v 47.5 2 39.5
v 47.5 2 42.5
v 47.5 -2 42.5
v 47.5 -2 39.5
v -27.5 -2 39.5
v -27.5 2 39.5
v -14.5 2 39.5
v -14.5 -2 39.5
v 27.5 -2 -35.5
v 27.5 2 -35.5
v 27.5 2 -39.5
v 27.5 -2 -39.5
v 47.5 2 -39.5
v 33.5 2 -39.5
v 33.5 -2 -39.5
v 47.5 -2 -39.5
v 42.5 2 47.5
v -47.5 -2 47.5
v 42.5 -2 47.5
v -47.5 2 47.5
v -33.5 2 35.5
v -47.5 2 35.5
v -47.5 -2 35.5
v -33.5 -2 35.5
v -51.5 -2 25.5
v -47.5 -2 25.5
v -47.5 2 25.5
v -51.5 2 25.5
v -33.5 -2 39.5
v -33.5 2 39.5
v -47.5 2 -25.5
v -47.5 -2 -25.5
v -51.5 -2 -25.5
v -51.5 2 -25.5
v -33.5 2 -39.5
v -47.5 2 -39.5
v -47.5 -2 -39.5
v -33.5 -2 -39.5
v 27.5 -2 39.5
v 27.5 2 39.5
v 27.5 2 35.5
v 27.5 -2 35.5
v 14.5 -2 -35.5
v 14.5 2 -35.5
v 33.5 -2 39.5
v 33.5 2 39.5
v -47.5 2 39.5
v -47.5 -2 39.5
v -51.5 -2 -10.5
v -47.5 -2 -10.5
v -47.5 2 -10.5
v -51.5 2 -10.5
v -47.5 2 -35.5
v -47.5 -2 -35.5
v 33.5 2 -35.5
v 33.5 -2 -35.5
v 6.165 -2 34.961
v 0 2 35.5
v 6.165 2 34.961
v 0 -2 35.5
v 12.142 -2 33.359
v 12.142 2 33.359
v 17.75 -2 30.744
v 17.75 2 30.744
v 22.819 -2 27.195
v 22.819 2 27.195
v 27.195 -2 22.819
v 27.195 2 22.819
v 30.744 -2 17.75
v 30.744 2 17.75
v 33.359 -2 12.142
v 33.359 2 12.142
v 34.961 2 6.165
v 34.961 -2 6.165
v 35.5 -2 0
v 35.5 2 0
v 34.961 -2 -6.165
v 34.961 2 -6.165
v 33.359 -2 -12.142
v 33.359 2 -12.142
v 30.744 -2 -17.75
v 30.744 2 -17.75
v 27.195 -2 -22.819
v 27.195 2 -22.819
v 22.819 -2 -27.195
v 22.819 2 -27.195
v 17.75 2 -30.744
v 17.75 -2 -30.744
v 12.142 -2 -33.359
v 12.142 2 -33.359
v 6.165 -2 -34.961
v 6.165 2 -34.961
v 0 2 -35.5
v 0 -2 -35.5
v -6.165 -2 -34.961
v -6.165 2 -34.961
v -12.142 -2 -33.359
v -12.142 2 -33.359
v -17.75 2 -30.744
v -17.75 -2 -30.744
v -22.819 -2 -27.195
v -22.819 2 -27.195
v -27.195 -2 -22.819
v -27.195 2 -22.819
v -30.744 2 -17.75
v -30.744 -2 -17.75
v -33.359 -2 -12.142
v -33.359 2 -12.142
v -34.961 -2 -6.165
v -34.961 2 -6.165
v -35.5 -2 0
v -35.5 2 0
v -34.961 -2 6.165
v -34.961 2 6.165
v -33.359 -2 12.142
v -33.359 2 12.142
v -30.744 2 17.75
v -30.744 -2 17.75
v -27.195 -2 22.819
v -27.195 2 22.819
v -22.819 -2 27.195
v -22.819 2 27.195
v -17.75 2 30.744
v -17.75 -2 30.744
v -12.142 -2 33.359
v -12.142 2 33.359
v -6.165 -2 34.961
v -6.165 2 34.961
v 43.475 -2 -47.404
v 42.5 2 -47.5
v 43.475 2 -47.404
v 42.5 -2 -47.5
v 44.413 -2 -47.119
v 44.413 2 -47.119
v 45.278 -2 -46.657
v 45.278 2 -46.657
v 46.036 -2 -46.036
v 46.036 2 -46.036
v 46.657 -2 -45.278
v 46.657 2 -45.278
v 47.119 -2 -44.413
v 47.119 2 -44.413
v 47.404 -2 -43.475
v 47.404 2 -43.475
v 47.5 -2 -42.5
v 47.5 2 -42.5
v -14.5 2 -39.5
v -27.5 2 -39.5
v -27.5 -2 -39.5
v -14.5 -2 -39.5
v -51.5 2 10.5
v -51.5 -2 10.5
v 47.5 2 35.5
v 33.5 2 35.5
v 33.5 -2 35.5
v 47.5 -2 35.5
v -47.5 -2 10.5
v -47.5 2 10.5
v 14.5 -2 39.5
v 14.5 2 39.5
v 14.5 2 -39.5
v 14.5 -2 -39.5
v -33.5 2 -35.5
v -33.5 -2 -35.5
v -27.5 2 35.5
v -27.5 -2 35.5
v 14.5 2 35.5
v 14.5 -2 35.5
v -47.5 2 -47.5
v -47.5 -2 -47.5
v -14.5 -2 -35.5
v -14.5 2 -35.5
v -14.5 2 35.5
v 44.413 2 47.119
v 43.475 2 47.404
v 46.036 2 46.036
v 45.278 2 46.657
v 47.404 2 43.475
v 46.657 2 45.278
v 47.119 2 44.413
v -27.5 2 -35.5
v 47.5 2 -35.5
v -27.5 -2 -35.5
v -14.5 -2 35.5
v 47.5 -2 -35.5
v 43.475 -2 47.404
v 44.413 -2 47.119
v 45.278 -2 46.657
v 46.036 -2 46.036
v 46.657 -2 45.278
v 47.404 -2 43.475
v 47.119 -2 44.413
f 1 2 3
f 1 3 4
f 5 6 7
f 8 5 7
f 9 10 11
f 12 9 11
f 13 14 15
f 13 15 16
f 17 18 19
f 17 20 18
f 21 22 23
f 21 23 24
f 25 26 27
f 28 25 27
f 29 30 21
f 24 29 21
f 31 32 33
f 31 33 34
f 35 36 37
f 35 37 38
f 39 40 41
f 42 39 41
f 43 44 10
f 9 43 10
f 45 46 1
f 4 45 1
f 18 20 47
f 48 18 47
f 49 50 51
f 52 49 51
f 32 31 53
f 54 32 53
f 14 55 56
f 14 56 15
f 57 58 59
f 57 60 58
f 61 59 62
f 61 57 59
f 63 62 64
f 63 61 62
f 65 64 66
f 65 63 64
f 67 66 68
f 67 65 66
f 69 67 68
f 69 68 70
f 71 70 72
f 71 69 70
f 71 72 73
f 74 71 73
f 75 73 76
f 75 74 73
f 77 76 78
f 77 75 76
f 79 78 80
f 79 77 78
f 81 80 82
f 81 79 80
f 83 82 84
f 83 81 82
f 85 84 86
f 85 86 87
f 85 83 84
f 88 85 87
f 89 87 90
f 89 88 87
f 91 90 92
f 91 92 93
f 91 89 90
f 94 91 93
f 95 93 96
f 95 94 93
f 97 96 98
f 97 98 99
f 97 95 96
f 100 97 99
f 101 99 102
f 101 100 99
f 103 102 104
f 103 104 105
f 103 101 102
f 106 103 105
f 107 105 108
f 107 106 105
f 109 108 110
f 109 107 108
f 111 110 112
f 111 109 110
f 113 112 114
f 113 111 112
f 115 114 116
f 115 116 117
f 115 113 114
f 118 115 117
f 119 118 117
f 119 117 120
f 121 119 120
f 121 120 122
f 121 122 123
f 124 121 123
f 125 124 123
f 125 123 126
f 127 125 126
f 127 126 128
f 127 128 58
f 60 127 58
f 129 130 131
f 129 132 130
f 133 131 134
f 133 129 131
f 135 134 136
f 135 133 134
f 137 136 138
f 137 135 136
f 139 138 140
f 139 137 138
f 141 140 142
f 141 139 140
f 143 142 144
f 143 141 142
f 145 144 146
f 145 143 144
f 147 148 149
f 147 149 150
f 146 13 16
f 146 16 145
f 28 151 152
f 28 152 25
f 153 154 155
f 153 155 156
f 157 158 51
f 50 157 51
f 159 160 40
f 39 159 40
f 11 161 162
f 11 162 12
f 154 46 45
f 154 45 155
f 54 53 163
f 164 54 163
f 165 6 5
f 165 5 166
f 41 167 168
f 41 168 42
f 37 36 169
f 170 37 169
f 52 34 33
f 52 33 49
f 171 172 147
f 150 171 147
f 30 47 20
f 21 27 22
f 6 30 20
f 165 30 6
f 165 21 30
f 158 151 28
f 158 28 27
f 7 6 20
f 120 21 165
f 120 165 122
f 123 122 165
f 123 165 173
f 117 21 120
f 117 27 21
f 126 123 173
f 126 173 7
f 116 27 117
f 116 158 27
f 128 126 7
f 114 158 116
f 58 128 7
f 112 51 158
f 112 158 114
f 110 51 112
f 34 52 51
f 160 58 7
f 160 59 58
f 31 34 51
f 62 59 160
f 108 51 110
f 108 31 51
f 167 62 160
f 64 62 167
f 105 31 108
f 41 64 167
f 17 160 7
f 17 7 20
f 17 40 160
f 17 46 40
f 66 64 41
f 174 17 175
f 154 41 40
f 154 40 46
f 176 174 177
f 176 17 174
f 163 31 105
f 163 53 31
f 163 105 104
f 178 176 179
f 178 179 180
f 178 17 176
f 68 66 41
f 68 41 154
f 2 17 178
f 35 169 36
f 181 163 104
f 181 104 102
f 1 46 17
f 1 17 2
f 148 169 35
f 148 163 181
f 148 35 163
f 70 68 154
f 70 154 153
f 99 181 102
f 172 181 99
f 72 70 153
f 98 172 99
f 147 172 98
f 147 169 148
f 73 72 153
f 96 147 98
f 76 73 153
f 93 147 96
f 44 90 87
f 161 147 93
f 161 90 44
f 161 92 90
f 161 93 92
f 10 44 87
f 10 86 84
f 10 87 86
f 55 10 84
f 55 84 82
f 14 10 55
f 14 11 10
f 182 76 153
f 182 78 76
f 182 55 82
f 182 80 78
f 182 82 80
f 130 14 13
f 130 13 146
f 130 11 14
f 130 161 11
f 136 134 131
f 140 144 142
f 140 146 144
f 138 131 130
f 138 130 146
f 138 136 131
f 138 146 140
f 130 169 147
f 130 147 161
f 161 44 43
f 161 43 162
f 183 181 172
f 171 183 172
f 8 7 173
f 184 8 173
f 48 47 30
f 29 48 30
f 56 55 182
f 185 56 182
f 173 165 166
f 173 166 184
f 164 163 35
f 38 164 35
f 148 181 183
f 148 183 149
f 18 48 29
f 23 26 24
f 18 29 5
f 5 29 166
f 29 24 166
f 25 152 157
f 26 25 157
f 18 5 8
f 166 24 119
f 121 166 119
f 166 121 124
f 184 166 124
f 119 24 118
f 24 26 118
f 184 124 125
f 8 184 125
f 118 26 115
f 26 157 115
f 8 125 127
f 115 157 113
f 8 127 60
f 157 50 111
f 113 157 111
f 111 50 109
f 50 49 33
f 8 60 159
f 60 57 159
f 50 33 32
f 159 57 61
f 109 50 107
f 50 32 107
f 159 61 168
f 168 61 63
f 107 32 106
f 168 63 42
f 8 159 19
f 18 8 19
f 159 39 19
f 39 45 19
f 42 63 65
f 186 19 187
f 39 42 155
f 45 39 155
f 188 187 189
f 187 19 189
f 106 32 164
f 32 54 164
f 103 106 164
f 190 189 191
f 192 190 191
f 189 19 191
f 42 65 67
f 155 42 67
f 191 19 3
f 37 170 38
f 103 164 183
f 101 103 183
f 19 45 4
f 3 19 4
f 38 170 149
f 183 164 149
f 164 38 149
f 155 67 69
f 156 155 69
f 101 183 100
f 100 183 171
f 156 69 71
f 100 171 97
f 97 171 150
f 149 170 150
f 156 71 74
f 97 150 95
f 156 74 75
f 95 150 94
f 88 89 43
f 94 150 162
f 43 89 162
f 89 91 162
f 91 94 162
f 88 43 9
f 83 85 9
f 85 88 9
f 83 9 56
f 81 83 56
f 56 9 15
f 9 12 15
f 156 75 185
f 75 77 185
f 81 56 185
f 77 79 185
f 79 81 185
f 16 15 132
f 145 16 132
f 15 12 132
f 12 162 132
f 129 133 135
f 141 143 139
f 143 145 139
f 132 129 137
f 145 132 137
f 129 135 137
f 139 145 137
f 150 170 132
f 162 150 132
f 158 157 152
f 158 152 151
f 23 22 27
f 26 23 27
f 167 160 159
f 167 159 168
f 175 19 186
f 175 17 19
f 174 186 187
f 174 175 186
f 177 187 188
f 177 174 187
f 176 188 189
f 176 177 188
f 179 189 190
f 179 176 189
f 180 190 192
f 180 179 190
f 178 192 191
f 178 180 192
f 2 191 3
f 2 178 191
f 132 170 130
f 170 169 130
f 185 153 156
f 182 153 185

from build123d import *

# Parameters (mm, degrees)
SKETCH1_W           = 95
SKETCH1_H           = 95
SKETCH1_R           = 35.5
BOSS_EXTRUDE1_DEPTH = 2
SKETCH3_W           = 14
SKETCH3_H           = 4
SKETCH3_W_2         = 13
CUT_EXTRUDE5_DEPTH  = 68.294130502
SKETCH4_W           = 15
SKETCH4_H           = 4
BOSS_EXTRUDE2_DEPTH = 4
FILLET1_R           = 5


with BuildPart() as part:
    # Sketch1 → Boss-Extrude1 (new, symmetric)
    with BuildSketch(Plane(origin=(0, 0, 0), x_dir=(1, 0, 0), z_dir=(0, 1, 0))):
        Rectangle(SKETCH1_W, SKETCH1_H)
        Circle(SKETCH1_R, mode=Mode.SUBTRACT)
    extrude(amount=BOSS_EXTRUDE1_DEPTH, both=True)

    # Sketch3 → Cut-Extrude5 (cut, through all)
    with BuildSketch(Plane(origin=(0, 2, 0), x_dir=(1, 0, 0), z_dir=(0, 1, 0))):
        with Locations((-40.5, -37.5)):
            Rectangle(SKETCH3_W, SKETCH3_H)
        with Locations((-40.5, 37.5)):
            Rectangle(SKETCH3_W, SKETCH3_H)
        with Locations((21, 37.5)):
            Rectangle(SKETCH3_W_2, SKETCH3_H)
        with Locations((40.5, -37.5)):
            Rectangle(SKETCH3_W, SKETCH3_H)
        with Locations((40.5, 37.5)):
            Rectangle(SKETCH3_W, SKETCH3_H)
        with Locations((21, -37.5)):
            Rectangle(SKETCH3_W_2, SKETCH3_H)
        with Locations((-21, -37.5)):
            Rectangle(SKETCH3_W_2, SKETCH3_H)
        with Locations((-21, 37.5)):
            Rectangle(SKETCH3_W_2, SKETCH3_H)
    extrude(amount=-CUT_EXTRUDE5_DEPTH, mode=Mode.SUBTRACT)

    # Sketch4 → Boss-Extrude2 (add)
    with BuildSketch(Plane.ZY.offset(47.5)):
        with Locations((-18, 0)):
            Rectangle(SKETCH4_W, SKETCH4_H)
        with Locations((18, 0)):
            Rectangle(SKETCH4_W, SKETCH4_H)
    extrude(amount=BOSS_EXTRUDE2_DEPTH)

    # Fillet1
    fillet1_edges = [part.edges().sort_by_distance(p)[0] for p in [
        (47.5, 0, -47.5),
        (47.5, 0, 47.5),
    ]]
    fillet(fillet1_edges, radius=FILLET1_R)


solid = part.part
